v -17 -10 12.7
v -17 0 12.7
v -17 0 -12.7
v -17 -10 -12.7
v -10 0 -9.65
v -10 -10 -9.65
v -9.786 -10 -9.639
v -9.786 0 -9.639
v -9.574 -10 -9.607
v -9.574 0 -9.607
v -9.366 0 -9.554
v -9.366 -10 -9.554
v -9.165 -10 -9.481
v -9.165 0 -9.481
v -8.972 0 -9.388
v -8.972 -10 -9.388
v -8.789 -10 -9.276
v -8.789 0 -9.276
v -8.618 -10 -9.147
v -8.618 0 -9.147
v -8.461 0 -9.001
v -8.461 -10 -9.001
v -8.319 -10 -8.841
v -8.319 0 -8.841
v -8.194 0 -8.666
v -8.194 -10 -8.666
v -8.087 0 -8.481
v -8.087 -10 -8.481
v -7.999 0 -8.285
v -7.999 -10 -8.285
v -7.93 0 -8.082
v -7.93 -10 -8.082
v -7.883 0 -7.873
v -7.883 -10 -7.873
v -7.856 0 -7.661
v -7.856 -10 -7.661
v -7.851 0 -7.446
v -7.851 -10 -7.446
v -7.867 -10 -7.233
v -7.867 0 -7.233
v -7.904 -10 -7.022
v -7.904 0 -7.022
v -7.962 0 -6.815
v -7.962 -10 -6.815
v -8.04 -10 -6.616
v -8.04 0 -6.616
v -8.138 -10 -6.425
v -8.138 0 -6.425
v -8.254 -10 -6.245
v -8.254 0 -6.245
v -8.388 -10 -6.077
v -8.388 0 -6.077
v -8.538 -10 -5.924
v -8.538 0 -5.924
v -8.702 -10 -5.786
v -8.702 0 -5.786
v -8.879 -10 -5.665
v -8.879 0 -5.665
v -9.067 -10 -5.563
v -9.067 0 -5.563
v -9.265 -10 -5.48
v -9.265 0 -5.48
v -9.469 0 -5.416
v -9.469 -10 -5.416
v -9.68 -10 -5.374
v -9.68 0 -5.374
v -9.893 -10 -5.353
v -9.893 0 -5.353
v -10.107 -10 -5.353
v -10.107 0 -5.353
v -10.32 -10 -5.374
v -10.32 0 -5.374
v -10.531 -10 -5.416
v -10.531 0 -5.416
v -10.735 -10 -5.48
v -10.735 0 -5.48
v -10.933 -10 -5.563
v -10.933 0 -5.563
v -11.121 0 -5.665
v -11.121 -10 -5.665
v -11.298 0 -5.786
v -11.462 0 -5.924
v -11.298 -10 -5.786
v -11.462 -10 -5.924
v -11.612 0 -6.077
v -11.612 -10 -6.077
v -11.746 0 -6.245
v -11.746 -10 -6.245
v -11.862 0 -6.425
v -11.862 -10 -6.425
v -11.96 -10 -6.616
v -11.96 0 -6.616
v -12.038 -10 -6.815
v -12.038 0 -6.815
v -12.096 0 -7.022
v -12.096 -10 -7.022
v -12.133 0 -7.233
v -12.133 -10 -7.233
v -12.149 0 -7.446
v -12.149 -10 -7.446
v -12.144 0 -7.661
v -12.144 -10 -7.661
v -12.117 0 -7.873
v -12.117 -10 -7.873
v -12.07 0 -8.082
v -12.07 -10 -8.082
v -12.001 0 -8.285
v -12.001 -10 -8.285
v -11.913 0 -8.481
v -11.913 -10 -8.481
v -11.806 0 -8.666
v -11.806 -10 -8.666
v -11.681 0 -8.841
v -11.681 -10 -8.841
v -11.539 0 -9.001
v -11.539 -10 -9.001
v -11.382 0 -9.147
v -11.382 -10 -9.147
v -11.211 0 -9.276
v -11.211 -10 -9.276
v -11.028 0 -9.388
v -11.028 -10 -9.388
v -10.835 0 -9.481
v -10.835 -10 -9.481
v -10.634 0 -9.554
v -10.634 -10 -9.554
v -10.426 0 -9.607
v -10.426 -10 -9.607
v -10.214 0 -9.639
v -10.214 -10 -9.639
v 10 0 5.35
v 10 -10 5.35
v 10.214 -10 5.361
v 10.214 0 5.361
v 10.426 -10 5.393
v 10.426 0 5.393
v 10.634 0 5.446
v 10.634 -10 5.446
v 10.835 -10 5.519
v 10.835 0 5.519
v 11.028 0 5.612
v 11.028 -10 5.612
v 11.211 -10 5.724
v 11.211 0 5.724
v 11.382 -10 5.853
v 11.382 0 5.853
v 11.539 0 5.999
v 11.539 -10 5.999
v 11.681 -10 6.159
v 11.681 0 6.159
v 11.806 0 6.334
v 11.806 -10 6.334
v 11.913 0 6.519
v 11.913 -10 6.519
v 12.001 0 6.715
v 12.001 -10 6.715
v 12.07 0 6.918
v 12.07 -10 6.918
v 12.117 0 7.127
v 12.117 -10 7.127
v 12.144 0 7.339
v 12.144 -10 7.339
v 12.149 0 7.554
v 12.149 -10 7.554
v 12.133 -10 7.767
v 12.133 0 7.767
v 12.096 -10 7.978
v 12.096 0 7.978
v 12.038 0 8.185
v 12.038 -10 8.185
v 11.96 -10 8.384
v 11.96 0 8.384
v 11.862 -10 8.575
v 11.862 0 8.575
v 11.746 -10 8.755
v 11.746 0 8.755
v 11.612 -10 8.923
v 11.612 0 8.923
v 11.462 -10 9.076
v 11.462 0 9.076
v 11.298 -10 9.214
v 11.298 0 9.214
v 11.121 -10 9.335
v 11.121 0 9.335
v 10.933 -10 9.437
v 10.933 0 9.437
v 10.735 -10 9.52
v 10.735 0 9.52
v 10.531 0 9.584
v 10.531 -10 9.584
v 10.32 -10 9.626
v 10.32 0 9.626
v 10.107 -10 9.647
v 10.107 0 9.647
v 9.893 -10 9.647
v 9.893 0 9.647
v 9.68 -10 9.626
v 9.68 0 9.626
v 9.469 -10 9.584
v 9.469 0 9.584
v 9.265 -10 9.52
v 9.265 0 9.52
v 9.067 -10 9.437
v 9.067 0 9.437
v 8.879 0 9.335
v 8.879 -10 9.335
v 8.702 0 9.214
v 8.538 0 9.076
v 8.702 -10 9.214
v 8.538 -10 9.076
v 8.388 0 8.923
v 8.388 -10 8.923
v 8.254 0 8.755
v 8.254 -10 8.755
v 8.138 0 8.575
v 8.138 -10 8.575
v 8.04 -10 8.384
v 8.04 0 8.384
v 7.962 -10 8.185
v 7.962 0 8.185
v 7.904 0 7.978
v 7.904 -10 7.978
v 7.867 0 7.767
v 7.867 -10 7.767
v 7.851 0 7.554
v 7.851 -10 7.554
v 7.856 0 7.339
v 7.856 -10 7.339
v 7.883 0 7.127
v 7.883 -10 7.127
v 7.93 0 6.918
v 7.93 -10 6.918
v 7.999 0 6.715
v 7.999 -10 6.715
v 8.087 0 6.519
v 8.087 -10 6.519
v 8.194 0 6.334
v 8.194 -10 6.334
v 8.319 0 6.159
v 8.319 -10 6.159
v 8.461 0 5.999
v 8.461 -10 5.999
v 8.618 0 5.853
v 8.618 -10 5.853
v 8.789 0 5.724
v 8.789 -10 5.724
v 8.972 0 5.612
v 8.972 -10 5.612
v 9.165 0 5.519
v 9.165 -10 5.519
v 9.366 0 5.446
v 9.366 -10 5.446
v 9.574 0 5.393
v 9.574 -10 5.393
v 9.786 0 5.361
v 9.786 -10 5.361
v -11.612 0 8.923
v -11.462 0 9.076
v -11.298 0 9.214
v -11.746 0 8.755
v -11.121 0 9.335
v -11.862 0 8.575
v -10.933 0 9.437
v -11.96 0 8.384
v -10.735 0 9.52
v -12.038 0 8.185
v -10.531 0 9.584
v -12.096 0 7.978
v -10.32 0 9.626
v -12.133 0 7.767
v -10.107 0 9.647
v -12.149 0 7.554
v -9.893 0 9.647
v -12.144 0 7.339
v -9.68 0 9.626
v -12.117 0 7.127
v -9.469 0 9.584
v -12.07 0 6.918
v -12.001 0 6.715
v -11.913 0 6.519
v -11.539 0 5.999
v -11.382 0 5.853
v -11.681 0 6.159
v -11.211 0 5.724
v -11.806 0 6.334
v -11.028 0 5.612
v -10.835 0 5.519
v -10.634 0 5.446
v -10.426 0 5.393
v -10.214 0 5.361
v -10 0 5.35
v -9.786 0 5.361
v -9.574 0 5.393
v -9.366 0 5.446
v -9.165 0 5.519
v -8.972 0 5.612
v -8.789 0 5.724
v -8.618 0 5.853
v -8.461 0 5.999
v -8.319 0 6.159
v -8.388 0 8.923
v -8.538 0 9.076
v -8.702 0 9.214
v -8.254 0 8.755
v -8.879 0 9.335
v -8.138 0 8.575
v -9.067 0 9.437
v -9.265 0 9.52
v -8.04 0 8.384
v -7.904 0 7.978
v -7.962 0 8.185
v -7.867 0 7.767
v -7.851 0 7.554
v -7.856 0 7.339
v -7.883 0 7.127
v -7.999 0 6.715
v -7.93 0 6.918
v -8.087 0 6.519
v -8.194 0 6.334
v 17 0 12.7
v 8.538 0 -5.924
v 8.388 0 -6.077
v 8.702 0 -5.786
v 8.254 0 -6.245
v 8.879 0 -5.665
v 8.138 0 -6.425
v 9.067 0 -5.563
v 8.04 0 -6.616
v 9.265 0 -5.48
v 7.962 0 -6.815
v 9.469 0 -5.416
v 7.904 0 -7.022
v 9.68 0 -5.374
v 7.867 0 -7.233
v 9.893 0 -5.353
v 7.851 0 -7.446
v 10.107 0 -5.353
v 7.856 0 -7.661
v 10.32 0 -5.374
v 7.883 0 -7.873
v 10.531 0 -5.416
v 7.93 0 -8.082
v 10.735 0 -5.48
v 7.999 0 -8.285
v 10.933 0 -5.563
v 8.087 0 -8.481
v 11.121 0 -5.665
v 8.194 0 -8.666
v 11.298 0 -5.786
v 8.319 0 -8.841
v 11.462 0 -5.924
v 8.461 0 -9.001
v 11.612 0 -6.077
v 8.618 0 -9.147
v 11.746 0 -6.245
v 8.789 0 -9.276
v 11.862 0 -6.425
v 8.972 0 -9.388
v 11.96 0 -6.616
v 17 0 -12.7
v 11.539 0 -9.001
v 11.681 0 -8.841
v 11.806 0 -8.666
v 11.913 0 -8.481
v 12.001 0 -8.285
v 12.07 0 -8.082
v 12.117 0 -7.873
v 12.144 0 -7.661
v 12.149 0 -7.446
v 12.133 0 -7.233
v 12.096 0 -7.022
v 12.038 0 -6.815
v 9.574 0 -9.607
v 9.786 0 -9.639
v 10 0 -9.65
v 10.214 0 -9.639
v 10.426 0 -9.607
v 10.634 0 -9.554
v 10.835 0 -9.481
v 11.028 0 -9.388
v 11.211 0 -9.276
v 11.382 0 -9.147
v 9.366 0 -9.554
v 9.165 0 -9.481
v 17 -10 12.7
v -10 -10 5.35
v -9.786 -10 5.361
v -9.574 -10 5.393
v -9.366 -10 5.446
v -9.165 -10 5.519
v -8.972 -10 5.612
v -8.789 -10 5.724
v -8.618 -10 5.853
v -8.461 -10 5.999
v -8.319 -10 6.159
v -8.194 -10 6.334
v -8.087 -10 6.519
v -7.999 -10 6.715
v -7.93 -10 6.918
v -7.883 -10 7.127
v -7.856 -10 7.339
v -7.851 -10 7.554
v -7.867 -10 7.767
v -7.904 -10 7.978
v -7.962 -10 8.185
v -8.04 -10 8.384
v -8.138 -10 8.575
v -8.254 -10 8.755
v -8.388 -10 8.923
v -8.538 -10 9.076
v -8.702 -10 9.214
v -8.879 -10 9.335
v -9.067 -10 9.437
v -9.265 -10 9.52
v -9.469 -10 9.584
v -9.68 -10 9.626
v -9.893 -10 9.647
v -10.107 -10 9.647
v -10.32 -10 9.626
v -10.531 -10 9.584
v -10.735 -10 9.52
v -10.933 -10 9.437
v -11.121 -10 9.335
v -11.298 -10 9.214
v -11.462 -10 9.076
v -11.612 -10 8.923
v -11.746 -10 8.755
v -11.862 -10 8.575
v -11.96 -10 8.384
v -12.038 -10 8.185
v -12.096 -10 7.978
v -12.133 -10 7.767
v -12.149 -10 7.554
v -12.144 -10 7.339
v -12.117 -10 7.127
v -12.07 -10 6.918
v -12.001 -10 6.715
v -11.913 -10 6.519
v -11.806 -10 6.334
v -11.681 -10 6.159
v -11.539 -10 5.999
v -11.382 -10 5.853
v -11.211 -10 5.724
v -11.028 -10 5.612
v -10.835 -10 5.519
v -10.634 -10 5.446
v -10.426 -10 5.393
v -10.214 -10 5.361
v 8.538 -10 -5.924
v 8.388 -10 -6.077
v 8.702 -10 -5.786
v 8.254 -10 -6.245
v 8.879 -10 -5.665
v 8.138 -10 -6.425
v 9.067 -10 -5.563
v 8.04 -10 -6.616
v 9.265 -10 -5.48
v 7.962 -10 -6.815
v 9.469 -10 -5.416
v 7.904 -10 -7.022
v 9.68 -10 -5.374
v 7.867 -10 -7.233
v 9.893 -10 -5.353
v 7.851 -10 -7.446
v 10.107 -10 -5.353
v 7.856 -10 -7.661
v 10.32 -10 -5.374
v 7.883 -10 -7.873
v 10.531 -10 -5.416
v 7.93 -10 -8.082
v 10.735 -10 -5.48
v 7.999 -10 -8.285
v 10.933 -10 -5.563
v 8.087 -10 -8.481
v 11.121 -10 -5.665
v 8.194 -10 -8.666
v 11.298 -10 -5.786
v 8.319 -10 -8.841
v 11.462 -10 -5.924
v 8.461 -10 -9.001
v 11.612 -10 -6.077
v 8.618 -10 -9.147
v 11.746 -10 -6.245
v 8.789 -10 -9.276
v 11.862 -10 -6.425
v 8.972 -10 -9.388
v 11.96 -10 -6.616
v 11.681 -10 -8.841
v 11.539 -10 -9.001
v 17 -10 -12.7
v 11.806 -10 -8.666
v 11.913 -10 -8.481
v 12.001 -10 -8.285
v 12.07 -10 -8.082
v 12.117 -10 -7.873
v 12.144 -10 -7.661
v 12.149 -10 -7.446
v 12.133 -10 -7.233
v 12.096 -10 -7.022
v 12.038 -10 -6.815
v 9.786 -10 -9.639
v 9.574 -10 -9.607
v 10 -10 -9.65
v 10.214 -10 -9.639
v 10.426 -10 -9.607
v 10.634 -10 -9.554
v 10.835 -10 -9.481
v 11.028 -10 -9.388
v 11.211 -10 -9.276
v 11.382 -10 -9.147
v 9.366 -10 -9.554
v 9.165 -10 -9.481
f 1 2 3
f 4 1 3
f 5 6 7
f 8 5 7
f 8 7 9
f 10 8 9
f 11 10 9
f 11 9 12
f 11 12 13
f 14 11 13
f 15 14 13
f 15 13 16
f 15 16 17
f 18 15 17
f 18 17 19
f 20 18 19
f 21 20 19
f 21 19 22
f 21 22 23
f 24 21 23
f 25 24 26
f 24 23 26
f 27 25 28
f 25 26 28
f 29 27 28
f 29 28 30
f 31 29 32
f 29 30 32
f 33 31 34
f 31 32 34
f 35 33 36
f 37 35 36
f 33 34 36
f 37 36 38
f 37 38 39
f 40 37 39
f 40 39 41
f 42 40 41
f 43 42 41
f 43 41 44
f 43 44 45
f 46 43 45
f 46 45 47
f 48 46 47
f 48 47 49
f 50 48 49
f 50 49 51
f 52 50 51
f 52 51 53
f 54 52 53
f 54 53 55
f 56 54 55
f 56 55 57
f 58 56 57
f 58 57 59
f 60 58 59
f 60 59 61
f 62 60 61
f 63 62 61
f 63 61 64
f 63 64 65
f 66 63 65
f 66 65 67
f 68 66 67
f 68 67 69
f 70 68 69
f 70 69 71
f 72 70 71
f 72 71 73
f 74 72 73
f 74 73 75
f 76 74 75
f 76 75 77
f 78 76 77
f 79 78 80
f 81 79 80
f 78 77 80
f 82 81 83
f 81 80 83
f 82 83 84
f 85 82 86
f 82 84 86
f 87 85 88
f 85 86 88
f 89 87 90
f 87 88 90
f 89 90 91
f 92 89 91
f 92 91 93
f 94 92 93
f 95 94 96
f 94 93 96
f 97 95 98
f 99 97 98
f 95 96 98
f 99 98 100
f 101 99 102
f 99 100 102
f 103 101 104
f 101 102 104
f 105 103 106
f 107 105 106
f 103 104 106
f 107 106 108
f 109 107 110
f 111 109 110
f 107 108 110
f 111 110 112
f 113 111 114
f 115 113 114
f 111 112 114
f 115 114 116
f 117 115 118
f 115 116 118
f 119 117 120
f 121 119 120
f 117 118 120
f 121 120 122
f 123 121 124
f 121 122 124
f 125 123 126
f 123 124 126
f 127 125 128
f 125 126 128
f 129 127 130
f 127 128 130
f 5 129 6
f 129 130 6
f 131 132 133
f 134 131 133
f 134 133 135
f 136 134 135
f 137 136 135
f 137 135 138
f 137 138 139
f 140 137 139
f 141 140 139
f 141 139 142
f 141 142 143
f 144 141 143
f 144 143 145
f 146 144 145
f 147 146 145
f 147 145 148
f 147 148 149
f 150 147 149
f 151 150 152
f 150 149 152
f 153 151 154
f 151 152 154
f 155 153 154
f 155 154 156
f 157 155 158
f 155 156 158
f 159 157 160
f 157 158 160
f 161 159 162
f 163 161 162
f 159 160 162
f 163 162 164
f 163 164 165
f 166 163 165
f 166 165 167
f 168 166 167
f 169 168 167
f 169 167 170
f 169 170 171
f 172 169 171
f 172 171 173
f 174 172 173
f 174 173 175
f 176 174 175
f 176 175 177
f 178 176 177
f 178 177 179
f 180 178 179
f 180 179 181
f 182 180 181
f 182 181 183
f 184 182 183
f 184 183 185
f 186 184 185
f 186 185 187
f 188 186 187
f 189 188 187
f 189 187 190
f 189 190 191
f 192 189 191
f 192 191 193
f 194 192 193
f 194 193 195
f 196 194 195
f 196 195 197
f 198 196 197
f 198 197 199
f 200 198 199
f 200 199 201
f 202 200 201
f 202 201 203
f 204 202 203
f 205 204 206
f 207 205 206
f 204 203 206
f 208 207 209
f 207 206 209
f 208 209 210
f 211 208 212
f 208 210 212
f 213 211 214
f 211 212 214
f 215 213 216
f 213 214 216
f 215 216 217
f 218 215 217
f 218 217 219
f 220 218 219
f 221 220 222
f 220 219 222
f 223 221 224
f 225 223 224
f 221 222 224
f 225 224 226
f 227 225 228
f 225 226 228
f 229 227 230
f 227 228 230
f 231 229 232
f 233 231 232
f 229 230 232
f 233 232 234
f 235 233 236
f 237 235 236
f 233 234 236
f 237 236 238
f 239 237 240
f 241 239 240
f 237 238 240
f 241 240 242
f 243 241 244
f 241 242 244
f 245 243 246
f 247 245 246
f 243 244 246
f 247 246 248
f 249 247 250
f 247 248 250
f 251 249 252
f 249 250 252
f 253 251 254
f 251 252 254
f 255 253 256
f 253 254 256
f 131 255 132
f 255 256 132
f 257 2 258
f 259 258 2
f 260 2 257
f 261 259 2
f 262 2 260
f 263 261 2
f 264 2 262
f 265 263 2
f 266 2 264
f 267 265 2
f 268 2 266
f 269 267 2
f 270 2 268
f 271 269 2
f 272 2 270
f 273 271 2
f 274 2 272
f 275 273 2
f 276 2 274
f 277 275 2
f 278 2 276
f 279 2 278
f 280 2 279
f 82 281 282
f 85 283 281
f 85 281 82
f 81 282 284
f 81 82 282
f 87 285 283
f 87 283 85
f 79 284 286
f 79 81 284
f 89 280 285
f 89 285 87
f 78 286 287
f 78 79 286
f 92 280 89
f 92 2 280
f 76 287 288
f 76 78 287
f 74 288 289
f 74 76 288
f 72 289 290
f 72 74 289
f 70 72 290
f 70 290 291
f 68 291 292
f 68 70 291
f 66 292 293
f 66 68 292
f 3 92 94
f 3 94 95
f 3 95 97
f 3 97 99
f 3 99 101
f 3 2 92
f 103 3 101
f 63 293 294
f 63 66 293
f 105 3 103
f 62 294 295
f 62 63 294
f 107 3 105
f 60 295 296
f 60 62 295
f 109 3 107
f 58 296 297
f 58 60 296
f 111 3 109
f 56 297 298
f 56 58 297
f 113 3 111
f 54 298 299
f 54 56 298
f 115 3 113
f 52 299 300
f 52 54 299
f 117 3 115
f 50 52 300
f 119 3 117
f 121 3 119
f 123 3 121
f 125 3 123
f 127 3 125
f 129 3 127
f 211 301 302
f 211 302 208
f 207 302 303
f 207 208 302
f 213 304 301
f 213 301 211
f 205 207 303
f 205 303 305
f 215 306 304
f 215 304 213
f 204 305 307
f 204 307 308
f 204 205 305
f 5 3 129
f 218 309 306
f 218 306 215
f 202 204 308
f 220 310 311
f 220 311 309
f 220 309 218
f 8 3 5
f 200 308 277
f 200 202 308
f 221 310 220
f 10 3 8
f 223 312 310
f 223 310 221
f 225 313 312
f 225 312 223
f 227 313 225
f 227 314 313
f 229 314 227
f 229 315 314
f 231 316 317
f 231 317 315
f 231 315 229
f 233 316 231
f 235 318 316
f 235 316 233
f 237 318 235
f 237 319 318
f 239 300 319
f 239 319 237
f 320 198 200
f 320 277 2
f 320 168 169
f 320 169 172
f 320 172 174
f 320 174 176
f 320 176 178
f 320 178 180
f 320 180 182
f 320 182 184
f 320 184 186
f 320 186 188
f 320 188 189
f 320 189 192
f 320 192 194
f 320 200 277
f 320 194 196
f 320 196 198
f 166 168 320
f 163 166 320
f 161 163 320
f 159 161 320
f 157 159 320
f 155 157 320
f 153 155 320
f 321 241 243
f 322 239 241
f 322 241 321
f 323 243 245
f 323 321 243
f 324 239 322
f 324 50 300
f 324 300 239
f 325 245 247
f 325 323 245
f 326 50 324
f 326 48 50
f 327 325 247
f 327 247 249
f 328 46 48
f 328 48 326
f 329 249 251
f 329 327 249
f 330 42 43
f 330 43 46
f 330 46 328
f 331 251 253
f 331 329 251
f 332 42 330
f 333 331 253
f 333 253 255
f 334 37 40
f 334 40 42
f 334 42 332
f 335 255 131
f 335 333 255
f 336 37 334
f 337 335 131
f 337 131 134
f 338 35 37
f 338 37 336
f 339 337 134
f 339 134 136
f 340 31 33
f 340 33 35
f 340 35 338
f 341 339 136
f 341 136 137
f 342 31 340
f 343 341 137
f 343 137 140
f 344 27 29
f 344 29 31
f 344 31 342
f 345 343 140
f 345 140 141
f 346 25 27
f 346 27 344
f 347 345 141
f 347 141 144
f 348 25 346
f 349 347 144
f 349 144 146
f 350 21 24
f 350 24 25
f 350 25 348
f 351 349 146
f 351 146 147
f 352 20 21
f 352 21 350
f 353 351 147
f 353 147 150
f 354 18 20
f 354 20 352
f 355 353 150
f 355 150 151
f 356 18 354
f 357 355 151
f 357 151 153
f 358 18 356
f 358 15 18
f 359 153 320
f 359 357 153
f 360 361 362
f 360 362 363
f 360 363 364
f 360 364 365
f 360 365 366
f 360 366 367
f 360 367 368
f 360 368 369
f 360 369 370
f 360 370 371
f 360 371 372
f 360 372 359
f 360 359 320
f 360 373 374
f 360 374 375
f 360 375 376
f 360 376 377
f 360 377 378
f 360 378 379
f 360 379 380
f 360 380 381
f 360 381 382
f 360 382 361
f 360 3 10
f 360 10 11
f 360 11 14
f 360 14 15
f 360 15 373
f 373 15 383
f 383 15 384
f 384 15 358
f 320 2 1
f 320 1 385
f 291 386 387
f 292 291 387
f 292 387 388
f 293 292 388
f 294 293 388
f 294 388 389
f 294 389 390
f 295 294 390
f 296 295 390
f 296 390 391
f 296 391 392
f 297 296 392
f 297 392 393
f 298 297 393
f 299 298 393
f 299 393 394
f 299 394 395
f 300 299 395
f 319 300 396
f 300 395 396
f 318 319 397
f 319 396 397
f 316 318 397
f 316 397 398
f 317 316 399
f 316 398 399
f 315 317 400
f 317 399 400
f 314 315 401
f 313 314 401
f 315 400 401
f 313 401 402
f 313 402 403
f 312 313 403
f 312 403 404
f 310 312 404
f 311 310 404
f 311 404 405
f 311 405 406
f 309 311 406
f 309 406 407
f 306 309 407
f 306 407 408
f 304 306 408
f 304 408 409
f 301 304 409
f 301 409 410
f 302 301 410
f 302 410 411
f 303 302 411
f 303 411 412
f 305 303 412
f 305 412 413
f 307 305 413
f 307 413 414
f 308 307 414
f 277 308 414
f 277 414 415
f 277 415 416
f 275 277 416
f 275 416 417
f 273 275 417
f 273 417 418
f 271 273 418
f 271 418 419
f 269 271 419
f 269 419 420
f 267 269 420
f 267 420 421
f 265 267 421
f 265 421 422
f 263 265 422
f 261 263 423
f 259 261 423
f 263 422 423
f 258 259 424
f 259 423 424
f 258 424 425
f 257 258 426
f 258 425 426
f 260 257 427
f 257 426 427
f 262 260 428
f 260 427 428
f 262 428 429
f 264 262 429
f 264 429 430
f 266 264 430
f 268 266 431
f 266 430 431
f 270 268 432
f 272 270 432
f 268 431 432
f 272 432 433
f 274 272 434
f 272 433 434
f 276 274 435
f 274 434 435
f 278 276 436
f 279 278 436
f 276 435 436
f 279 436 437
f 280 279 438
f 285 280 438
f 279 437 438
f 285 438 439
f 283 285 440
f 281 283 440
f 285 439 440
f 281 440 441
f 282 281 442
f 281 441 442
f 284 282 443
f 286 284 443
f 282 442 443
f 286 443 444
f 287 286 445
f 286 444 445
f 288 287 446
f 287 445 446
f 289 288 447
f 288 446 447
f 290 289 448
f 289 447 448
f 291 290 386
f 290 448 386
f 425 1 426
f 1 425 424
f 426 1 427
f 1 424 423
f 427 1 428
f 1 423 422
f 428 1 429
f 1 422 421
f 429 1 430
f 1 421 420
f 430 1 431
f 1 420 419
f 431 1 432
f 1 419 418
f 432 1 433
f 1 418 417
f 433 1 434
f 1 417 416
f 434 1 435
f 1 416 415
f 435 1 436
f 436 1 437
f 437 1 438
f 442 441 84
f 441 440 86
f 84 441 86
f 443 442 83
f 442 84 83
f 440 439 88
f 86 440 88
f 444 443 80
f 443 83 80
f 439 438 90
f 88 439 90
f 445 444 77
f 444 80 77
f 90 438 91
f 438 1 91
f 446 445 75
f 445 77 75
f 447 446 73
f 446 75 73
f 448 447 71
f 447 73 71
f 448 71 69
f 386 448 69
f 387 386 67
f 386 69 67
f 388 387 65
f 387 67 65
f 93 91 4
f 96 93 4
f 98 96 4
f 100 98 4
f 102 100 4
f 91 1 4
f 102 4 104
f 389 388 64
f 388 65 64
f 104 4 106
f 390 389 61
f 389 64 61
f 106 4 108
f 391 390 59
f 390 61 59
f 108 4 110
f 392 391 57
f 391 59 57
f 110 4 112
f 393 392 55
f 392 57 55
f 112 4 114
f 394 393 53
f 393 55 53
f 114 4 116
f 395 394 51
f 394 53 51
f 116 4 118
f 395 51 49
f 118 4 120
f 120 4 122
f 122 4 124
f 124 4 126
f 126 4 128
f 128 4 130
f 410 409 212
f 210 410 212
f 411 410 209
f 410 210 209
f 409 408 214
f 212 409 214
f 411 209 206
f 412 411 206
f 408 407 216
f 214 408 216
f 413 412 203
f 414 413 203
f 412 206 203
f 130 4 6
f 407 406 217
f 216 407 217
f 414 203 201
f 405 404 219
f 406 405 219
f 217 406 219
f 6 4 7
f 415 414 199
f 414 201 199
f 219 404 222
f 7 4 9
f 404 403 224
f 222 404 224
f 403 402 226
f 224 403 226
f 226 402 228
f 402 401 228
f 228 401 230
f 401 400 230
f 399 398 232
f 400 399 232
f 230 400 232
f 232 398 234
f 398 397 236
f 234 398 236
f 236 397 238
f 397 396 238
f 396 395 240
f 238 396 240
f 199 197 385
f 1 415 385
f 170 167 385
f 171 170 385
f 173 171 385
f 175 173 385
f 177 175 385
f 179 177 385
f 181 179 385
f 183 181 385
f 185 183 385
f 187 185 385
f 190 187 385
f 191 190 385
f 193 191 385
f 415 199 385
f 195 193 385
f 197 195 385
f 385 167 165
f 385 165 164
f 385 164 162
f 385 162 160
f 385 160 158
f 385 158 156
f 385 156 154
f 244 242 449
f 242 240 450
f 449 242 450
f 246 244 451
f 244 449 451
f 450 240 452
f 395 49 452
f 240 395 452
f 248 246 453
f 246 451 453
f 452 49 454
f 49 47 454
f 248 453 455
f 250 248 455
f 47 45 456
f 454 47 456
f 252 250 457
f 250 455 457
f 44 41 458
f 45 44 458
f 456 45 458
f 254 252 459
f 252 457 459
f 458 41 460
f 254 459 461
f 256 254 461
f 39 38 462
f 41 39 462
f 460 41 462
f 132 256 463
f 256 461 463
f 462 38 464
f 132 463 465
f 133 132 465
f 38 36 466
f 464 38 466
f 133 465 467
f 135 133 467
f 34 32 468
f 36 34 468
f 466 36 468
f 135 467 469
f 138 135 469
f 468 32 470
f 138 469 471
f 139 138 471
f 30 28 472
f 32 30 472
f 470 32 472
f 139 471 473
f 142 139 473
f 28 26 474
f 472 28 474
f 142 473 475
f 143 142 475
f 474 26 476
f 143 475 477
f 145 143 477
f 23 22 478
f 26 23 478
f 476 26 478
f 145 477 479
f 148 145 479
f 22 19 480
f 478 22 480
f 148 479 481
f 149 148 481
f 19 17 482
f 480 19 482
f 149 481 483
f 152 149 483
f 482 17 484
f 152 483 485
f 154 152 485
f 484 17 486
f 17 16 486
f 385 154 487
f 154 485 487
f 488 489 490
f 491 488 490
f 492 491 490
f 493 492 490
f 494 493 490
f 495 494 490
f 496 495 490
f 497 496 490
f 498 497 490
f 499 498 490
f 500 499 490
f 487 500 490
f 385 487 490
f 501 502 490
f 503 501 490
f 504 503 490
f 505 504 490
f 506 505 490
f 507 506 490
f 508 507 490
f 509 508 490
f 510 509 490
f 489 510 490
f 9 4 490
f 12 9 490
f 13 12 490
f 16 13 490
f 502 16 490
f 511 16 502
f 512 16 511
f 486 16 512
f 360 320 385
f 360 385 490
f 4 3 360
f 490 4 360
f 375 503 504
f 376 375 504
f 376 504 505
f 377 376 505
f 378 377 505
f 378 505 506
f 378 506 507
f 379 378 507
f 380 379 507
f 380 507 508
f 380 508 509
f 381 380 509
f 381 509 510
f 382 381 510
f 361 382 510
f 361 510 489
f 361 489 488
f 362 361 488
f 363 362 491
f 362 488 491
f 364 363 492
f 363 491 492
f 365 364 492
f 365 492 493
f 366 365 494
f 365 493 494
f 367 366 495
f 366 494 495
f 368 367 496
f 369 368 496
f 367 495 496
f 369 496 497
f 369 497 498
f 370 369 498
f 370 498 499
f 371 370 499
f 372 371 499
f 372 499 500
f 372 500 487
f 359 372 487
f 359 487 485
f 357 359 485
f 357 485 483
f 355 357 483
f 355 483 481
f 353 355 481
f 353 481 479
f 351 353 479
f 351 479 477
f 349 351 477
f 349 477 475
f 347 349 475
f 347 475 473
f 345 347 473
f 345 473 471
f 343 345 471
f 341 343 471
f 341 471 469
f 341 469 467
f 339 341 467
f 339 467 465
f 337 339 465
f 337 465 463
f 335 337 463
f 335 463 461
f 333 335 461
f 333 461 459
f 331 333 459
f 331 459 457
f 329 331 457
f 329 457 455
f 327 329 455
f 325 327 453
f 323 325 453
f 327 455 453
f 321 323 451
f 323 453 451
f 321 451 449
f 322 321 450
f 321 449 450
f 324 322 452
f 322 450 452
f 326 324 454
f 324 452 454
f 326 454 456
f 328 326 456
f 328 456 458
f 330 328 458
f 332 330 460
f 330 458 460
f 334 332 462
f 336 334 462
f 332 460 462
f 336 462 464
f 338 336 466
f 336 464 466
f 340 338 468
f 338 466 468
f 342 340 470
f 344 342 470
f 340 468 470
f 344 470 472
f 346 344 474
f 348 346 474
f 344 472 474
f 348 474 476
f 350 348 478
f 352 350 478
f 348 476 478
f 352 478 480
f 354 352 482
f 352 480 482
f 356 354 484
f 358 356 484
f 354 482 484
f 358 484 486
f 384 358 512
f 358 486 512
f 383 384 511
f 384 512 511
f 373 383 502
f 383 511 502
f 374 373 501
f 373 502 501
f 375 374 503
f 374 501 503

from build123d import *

# Parameters (mm, degrees)
SKETCH12_W           = 34
SKETCH12_H           = 25.4
BOSS_EXTRUDE2_DEPTH  = 10
M4_CLEARANCE_HOLE1_D = 4.3


with BuildPart() as part:
    # Sketch12 → Boss-Extrude2 (new body)
    with BuildSketch(Plane(origin=(0, 0, 0), x_dir=(1, 0, 0), z_dir=(0, 1, 0))):
        Rectangle(SKETCH12_W, SKETCH12_H)
    extrude(amount=-BOSS_EXTRUDE2_DEPTH)

    # M4 Clearance Hole1 (through all)
    with Locations(Plane(origin=(-10, 0, -7.5), x_dir=(0, 0, 1), z_dir=(0, 1, 0))):
        with Locations((0, 0), (15, 0), (15, 20), (0, 20)):
            Hole(M4_CLEARANCE_HOLE1_D / 2)


solid = part.part
